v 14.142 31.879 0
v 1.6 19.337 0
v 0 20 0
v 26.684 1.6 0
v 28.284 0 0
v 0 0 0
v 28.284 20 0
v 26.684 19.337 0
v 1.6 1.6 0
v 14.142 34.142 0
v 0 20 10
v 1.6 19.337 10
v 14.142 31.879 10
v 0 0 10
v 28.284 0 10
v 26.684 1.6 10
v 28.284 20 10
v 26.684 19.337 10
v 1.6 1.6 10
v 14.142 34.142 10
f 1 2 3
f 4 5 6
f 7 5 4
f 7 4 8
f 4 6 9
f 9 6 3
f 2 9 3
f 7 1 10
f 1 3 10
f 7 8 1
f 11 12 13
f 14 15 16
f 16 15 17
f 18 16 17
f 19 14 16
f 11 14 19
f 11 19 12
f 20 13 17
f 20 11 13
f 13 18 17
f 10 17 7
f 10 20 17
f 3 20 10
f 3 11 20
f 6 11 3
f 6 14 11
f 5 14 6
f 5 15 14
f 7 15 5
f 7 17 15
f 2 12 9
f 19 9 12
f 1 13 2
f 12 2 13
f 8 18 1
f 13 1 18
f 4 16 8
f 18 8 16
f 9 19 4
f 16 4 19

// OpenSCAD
// CoreXY printer test
//
// Allows to compare quality of horizontal/vertical lines vs
// diagonal lines.

l=20;
w=1.6;
h = 10;

w2=w/2;
k=1/sqrt(2);
lk = l*k;
wk = w*k;

outer_points = [
  [2*lk, 0], 
  [0, 0], 
  [0, l], 
  [lk, l+lk], 
  [2*lk, l ]
];

inner_points = [
  outer_points[0]+[-w, w],
  outer_points[1]+[w, w],
  outer_points[2]+[w, -w*tan(22.5)],
  outer_points[3]+[0, -w/k],
  outer_points[4]+[-w, -w*tan(22.5)] 
];

linear_extrude(height = h)
  difference() {
    polygon(outer_points);
    polygon(inner_points);
  }
